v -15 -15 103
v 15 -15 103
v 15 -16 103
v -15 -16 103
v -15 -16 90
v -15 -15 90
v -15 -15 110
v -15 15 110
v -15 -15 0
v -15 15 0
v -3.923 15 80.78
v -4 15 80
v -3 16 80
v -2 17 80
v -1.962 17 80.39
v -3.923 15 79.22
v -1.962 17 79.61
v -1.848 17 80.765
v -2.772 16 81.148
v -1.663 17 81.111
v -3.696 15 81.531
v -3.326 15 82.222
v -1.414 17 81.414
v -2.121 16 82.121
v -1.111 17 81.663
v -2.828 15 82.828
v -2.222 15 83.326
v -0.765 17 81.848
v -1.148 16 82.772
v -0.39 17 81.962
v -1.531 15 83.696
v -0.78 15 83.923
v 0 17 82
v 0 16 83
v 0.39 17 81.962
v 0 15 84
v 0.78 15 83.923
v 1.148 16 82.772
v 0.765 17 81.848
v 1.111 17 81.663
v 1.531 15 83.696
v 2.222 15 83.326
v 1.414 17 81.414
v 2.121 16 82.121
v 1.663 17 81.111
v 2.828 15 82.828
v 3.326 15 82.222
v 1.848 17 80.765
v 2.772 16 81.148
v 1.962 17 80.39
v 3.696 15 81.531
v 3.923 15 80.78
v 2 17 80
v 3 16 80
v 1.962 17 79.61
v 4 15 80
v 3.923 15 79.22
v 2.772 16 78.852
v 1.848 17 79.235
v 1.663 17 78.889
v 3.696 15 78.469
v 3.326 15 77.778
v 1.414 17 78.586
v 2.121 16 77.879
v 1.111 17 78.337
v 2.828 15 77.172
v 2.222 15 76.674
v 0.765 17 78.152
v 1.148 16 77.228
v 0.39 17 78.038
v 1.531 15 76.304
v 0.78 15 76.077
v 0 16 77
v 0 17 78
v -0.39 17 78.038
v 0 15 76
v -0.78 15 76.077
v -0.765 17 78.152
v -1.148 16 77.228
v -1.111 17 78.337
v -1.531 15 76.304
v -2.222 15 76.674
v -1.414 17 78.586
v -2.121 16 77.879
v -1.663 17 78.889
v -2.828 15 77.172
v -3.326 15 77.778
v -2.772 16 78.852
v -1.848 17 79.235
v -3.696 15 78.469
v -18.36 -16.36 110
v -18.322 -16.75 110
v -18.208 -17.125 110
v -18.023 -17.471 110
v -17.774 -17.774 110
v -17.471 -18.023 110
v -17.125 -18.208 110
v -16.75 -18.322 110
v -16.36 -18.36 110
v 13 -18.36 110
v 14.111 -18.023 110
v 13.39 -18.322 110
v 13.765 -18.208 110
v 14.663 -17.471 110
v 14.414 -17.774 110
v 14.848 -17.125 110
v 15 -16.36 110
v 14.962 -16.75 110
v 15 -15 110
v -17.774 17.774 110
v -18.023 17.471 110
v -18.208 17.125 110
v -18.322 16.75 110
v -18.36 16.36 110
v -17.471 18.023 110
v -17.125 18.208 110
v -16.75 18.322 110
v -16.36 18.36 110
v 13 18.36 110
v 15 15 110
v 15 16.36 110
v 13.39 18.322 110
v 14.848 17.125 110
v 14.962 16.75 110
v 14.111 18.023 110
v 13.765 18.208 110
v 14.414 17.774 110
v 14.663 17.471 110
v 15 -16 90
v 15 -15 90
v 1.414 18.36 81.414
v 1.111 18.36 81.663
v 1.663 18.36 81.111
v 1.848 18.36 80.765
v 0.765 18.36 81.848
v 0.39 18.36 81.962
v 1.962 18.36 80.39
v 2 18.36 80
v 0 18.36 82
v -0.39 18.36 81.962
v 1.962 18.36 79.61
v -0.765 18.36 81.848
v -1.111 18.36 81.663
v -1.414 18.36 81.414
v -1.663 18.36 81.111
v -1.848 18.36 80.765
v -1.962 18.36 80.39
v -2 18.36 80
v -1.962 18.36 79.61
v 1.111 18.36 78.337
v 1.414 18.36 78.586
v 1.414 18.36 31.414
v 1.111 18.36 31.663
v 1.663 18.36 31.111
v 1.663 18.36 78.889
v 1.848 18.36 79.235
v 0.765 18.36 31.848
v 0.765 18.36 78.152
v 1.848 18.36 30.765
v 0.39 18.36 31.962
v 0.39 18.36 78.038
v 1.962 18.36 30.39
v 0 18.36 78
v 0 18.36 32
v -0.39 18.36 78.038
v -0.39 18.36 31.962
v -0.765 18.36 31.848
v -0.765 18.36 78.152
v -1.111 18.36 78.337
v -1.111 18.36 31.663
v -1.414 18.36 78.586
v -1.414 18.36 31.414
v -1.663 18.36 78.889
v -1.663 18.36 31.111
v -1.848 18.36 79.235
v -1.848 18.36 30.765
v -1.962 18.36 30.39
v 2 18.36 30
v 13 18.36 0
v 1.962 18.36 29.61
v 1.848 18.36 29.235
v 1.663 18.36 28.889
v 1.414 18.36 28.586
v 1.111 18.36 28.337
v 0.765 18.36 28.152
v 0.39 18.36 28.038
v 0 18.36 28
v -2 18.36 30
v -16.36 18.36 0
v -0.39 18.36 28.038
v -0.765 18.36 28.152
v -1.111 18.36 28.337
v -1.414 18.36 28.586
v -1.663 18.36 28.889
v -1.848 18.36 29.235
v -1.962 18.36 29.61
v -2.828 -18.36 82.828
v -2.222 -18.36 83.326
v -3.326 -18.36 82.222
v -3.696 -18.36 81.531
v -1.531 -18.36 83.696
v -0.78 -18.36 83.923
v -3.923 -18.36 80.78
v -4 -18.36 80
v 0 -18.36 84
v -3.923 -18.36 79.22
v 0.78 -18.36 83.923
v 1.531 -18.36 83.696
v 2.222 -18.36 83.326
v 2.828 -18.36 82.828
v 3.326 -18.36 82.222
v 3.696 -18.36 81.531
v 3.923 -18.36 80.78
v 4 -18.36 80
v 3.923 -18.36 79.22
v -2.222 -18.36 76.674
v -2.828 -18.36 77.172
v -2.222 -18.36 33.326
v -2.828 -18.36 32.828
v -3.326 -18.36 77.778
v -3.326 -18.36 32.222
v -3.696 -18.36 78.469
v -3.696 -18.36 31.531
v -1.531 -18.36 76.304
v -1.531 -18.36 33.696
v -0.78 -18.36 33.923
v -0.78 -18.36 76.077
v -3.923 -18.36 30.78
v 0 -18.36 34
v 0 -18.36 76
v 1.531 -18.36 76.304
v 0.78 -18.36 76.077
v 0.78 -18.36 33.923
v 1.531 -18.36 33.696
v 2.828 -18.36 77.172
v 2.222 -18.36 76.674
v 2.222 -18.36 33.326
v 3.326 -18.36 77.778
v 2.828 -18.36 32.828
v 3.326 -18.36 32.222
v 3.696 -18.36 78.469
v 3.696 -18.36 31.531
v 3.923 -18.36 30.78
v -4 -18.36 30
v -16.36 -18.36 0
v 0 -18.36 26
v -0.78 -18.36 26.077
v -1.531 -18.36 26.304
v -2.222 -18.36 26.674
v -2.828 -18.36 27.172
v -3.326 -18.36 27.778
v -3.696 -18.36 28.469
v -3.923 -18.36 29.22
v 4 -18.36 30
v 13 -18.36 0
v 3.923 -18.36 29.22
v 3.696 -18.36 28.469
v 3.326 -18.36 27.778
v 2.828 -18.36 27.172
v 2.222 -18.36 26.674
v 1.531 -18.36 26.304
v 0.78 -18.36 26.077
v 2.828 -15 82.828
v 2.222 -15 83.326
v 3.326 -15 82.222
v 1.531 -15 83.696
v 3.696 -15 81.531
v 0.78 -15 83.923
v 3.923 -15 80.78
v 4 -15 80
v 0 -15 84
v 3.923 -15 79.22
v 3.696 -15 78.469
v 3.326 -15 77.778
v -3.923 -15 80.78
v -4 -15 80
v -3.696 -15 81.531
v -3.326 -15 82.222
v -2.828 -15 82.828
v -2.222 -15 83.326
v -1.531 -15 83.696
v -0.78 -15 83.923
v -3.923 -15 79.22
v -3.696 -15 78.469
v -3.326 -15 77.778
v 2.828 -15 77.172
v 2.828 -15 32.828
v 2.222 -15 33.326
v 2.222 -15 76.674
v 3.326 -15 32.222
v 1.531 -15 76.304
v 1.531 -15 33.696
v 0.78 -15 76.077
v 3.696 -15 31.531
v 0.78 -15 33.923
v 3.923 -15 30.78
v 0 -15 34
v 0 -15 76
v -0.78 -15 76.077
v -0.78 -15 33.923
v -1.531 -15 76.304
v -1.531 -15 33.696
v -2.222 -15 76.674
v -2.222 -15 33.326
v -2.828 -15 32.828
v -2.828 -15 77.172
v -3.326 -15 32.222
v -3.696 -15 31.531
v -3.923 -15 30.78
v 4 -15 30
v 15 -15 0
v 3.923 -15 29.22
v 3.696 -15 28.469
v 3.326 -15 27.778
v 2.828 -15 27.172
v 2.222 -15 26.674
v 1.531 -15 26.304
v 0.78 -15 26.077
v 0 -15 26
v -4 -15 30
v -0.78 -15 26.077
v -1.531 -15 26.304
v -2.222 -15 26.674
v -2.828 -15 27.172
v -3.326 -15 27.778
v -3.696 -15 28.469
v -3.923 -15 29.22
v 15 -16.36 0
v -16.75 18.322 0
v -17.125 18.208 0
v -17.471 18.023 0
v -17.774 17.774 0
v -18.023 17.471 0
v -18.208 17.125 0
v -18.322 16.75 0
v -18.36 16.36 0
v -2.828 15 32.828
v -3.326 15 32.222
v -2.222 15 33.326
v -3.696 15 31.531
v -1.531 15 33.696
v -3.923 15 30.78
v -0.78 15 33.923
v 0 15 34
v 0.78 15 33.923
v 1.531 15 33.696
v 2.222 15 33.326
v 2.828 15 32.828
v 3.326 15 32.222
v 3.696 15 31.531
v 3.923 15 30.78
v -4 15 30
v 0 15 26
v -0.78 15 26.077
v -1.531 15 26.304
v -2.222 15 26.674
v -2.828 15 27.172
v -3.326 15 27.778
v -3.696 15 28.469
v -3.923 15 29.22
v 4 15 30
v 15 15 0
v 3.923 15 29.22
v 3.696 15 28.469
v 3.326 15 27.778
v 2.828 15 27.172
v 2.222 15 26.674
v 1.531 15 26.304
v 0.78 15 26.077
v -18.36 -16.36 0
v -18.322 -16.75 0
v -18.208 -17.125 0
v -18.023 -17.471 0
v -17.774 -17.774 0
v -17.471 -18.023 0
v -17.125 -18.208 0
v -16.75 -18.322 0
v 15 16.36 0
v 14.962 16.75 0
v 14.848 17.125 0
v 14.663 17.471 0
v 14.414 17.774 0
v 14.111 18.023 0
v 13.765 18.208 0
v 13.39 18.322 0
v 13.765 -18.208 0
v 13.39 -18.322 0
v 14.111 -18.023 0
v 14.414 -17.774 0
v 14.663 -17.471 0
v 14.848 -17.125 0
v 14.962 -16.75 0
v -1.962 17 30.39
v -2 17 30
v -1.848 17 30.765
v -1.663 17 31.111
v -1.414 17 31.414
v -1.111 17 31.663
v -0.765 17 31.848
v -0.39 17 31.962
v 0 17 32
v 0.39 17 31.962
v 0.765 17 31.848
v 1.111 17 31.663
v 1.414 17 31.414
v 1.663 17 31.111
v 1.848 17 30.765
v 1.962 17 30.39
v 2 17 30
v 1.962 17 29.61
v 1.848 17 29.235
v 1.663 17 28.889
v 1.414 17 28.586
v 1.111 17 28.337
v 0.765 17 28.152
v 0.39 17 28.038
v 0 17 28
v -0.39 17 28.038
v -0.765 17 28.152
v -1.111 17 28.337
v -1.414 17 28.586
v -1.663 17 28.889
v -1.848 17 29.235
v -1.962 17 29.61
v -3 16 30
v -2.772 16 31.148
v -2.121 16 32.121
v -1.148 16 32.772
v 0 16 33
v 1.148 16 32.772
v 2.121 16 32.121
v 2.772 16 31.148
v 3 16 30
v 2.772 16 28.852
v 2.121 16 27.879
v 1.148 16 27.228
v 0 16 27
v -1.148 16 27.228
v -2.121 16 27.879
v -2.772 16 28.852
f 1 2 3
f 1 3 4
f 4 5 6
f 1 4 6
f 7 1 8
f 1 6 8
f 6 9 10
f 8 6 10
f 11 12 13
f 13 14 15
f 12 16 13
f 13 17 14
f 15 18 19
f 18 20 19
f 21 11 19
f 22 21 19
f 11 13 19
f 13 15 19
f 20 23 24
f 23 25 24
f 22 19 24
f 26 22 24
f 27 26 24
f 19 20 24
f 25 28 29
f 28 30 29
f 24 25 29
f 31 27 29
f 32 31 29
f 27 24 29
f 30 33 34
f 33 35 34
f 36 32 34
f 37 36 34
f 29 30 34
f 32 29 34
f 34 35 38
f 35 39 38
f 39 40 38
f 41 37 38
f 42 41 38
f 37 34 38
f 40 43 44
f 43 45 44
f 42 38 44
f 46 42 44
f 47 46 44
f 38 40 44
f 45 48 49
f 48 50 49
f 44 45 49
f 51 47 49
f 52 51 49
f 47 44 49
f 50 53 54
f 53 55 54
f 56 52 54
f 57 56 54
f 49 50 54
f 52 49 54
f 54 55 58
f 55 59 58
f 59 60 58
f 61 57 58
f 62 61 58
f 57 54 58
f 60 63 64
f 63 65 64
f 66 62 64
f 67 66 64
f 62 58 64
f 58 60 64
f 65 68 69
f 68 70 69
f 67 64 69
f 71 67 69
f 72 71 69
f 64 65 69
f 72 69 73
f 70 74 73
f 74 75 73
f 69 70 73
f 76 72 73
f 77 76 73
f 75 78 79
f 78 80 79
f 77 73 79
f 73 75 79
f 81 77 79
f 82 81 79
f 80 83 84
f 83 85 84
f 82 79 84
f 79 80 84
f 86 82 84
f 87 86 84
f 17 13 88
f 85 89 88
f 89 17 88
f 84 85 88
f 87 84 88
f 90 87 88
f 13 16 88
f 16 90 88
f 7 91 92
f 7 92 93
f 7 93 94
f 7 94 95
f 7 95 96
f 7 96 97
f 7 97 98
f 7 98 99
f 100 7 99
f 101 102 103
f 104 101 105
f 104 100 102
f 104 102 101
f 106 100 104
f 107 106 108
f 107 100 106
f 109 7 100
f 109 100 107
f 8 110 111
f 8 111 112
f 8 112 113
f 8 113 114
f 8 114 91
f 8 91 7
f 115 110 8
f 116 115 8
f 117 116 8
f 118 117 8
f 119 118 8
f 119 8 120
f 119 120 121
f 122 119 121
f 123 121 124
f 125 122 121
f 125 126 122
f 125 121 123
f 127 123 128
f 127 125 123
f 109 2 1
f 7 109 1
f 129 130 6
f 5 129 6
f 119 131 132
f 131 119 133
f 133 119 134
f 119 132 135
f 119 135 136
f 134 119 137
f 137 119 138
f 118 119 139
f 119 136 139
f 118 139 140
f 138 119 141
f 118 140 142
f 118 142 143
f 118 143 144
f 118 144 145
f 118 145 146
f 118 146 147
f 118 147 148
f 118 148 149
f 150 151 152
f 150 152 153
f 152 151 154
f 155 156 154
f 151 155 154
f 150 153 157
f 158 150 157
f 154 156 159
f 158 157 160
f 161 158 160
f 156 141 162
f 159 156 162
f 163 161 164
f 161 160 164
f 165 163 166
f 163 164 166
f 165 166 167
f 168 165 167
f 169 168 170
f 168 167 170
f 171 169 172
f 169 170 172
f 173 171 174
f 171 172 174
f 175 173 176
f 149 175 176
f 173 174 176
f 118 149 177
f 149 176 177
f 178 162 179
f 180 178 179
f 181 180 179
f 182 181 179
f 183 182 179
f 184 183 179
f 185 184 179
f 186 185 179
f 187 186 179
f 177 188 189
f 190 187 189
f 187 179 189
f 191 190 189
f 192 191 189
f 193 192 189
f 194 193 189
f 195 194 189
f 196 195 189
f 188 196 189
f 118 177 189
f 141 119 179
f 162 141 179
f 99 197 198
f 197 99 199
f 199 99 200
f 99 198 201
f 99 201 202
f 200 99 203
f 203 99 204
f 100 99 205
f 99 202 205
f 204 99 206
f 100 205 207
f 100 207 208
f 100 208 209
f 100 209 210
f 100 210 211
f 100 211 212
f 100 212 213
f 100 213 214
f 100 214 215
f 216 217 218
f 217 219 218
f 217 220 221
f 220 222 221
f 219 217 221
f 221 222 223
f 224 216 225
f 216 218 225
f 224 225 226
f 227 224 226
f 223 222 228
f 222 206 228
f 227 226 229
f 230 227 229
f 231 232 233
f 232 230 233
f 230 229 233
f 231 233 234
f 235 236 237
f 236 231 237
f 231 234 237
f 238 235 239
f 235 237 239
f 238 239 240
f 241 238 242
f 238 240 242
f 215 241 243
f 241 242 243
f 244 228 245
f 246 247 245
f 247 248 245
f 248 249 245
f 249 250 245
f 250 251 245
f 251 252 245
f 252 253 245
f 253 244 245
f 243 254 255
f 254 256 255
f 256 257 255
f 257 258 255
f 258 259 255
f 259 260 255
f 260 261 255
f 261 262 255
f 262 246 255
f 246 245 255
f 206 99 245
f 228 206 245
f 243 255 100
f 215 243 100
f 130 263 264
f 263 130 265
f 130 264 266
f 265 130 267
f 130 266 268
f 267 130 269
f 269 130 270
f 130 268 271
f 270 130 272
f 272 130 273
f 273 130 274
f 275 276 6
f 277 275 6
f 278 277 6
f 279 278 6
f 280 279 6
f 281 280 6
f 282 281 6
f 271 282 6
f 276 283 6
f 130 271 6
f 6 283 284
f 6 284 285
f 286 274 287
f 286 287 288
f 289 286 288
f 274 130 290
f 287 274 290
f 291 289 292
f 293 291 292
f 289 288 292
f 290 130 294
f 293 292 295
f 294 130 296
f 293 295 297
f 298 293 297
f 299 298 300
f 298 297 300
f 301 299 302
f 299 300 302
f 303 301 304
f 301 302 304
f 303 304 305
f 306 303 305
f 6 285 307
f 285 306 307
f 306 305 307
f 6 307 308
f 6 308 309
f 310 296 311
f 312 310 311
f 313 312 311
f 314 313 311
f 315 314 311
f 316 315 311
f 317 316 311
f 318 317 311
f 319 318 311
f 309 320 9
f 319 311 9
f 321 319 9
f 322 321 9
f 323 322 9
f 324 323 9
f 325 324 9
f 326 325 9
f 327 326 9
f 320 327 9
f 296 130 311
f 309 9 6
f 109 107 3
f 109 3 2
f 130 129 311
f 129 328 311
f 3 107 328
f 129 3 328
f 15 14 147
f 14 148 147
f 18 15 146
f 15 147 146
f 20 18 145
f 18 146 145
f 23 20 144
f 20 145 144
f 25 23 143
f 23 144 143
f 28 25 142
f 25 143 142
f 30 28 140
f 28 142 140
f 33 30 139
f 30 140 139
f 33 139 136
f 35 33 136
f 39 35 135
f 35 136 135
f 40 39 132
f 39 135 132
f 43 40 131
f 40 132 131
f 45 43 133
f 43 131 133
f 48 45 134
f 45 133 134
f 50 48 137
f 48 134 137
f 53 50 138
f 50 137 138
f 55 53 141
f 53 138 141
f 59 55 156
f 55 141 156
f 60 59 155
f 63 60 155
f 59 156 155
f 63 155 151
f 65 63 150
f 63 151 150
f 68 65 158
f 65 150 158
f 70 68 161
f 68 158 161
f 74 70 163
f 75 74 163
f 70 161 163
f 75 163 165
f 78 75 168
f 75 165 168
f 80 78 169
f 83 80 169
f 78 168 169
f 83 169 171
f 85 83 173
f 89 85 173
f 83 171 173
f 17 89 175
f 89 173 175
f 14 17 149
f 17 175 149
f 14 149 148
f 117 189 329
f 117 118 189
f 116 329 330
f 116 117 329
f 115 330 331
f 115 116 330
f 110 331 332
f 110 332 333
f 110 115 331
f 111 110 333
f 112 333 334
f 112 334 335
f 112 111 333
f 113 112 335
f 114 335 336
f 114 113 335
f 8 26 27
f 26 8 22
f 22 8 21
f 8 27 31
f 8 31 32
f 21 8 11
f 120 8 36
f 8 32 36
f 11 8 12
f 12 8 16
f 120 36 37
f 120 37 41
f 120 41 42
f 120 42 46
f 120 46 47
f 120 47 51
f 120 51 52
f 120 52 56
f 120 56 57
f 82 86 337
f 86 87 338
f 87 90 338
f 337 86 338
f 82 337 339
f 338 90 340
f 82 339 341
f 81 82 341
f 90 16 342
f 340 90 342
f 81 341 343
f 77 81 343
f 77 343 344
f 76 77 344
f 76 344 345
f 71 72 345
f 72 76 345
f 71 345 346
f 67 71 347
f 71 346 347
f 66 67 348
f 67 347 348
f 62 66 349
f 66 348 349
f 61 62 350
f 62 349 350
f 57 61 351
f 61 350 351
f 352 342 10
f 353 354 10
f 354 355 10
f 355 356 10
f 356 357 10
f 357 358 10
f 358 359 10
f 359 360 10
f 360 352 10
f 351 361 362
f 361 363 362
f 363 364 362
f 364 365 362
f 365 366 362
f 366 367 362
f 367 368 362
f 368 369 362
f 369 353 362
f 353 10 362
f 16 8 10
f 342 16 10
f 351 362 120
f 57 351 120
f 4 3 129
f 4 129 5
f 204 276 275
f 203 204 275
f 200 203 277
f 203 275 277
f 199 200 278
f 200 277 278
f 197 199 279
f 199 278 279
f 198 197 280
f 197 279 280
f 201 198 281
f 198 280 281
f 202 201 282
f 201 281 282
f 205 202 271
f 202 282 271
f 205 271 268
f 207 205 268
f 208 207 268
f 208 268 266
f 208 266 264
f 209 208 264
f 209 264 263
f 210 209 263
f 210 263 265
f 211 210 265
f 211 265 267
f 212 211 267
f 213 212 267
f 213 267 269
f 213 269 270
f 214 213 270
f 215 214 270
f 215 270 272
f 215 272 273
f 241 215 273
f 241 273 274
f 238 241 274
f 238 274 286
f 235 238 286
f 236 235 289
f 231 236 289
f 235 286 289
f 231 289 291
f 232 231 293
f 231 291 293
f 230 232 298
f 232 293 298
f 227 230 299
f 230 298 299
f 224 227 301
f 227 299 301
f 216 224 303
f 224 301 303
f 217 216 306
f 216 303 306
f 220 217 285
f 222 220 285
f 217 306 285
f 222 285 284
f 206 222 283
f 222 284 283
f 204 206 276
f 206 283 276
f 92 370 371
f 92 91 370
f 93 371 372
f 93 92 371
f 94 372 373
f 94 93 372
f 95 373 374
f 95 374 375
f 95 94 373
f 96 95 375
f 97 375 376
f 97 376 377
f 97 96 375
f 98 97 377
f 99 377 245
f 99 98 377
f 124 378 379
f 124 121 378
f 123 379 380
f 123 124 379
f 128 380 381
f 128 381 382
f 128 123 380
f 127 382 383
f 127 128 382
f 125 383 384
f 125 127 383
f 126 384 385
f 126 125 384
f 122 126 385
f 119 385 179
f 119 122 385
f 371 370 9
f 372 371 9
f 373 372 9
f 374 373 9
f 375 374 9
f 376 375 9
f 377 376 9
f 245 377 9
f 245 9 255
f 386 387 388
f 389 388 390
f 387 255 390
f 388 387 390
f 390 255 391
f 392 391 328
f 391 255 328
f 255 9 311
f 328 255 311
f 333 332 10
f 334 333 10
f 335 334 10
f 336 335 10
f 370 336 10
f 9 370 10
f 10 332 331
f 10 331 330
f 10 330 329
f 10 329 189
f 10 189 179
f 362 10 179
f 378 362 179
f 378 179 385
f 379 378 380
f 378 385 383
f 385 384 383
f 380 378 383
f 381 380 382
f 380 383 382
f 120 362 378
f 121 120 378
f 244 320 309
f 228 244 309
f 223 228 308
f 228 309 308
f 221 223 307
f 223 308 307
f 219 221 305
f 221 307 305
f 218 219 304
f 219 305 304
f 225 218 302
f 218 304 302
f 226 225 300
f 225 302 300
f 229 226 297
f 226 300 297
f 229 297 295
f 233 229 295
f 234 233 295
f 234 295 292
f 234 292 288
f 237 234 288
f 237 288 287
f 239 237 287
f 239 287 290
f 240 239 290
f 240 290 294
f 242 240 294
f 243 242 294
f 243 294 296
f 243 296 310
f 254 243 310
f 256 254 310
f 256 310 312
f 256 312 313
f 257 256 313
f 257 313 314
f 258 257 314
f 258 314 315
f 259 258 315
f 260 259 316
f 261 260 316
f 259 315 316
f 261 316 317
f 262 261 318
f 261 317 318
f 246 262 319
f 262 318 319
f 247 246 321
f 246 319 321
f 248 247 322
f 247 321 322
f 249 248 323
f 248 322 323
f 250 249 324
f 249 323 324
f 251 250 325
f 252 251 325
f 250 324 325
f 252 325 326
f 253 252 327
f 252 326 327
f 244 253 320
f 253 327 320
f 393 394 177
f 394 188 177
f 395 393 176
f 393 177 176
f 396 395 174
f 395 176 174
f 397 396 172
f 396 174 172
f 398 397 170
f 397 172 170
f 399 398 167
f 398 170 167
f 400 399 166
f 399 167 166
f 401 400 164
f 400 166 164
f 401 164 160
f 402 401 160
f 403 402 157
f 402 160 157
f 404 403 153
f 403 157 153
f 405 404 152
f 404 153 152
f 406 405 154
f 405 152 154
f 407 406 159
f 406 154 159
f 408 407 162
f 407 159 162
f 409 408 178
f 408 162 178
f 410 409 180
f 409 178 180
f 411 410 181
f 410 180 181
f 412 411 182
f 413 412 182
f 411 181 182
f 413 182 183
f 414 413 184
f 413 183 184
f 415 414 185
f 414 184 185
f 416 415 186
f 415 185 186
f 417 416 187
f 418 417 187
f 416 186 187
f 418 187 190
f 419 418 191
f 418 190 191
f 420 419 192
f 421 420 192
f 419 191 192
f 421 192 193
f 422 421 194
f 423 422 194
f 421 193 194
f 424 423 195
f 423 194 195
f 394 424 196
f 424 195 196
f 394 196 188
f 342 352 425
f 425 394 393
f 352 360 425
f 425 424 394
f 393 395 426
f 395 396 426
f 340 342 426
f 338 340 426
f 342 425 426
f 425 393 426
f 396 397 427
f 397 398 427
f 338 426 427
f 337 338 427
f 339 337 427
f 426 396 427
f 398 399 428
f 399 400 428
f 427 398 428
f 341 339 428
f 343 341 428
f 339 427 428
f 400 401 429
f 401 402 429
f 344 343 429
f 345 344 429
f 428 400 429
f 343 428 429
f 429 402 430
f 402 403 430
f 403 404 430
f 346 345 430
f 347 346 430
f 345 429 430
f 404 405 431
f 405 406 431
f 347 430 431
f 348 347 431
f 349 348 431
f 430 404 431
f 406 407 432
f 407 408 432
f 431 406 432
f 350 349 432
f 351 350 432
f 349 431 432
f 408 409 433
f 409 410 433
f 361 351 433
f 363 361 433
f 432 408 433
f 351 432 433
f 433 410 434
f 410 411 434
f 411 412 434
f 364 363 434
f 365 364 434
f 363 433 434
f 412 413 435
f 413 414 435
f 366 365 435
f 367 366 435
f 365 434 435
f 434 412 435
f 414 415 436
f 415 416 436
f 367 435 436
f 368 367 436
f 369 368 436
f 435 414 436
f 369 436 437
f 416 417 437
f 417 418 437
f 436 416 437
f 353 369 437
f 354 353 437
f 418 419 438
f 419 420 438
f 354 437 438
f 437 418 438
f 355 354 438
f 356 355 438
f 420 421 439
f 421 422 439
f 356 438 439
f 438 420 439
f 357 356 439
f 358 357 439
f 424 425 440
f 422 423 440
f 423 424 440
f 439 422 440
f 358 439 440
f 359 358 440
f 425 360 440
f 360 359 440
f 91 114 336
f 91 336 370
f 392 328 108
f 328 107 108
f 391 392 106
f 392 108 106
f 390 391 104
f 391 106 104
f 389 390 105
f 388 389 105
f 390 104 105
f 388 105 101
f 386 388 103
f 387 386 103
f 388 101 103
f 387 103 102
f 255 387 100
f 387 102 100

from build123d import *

# Parameters (mm, degrees)
F1_DEPTH       = 110
F2_R           = 2
F4_D           = 8
F4_DEPTH       = 4
F6_D           = 4
F6_DEPTH       = 4
F6_CSINK_D     = 8
F6_CSINK_ANGLE = 90
F7_W           = 30
F7_H           = 13
F8_DEPTH       = 1


with BuildPart() as f1:
    # F0 (on Top) → F1 (new body)
    with BuildSketch(Plane.XY):
        Polygon((15, -18.36), (15, -15), (-15, -15), (-15, 15), (15, 15), (15, 18.36), (-18.36, 18.36), (-18.36, -18.36), align=None)
    extrude(amount=F1_DEPTH)

    # F2
    f2_edges = [f1.edges().sort_by_distance(p)[0] for p in [
        (-18.36, -18.36, 55),
        (-18.36, 18.36, 55),
        (15, -18.36, 55),
        (15, 18.36, 55),
    ]]
    fillet(f2_edges, radius=F2_R)

    # F4
    with Locations(Plane.XZ.offset(18.36)):
        with Locations((0, 30), (0, 80)):
            Hole(F4_D / 2, depth=F4_DEPTH)

    # F6
    with Locations(Plane.XZ.offset(-15)):
        with Locations((0, 30), (0, 80)):
            CounterSinkHole(F6_D / 2, F6_CSINK_D / 2, depth=F6_DEPTH, counter_sink_angle=F6_CSINK_ANGLE)

    # F7 (on face) → F8 (cut)
    with BuildSketch(Plane(origin=(0, -15, 0), x_dir=(-1, 0, 0), z_dir=(0, 1, 0))):
        with Locations((0, 96.5)):
            Rectangle(F7_W, F7_H)
    extrude(amount=-F8_DEPTH, mode=Mode.SUBTRACT)


solid = f1.part
